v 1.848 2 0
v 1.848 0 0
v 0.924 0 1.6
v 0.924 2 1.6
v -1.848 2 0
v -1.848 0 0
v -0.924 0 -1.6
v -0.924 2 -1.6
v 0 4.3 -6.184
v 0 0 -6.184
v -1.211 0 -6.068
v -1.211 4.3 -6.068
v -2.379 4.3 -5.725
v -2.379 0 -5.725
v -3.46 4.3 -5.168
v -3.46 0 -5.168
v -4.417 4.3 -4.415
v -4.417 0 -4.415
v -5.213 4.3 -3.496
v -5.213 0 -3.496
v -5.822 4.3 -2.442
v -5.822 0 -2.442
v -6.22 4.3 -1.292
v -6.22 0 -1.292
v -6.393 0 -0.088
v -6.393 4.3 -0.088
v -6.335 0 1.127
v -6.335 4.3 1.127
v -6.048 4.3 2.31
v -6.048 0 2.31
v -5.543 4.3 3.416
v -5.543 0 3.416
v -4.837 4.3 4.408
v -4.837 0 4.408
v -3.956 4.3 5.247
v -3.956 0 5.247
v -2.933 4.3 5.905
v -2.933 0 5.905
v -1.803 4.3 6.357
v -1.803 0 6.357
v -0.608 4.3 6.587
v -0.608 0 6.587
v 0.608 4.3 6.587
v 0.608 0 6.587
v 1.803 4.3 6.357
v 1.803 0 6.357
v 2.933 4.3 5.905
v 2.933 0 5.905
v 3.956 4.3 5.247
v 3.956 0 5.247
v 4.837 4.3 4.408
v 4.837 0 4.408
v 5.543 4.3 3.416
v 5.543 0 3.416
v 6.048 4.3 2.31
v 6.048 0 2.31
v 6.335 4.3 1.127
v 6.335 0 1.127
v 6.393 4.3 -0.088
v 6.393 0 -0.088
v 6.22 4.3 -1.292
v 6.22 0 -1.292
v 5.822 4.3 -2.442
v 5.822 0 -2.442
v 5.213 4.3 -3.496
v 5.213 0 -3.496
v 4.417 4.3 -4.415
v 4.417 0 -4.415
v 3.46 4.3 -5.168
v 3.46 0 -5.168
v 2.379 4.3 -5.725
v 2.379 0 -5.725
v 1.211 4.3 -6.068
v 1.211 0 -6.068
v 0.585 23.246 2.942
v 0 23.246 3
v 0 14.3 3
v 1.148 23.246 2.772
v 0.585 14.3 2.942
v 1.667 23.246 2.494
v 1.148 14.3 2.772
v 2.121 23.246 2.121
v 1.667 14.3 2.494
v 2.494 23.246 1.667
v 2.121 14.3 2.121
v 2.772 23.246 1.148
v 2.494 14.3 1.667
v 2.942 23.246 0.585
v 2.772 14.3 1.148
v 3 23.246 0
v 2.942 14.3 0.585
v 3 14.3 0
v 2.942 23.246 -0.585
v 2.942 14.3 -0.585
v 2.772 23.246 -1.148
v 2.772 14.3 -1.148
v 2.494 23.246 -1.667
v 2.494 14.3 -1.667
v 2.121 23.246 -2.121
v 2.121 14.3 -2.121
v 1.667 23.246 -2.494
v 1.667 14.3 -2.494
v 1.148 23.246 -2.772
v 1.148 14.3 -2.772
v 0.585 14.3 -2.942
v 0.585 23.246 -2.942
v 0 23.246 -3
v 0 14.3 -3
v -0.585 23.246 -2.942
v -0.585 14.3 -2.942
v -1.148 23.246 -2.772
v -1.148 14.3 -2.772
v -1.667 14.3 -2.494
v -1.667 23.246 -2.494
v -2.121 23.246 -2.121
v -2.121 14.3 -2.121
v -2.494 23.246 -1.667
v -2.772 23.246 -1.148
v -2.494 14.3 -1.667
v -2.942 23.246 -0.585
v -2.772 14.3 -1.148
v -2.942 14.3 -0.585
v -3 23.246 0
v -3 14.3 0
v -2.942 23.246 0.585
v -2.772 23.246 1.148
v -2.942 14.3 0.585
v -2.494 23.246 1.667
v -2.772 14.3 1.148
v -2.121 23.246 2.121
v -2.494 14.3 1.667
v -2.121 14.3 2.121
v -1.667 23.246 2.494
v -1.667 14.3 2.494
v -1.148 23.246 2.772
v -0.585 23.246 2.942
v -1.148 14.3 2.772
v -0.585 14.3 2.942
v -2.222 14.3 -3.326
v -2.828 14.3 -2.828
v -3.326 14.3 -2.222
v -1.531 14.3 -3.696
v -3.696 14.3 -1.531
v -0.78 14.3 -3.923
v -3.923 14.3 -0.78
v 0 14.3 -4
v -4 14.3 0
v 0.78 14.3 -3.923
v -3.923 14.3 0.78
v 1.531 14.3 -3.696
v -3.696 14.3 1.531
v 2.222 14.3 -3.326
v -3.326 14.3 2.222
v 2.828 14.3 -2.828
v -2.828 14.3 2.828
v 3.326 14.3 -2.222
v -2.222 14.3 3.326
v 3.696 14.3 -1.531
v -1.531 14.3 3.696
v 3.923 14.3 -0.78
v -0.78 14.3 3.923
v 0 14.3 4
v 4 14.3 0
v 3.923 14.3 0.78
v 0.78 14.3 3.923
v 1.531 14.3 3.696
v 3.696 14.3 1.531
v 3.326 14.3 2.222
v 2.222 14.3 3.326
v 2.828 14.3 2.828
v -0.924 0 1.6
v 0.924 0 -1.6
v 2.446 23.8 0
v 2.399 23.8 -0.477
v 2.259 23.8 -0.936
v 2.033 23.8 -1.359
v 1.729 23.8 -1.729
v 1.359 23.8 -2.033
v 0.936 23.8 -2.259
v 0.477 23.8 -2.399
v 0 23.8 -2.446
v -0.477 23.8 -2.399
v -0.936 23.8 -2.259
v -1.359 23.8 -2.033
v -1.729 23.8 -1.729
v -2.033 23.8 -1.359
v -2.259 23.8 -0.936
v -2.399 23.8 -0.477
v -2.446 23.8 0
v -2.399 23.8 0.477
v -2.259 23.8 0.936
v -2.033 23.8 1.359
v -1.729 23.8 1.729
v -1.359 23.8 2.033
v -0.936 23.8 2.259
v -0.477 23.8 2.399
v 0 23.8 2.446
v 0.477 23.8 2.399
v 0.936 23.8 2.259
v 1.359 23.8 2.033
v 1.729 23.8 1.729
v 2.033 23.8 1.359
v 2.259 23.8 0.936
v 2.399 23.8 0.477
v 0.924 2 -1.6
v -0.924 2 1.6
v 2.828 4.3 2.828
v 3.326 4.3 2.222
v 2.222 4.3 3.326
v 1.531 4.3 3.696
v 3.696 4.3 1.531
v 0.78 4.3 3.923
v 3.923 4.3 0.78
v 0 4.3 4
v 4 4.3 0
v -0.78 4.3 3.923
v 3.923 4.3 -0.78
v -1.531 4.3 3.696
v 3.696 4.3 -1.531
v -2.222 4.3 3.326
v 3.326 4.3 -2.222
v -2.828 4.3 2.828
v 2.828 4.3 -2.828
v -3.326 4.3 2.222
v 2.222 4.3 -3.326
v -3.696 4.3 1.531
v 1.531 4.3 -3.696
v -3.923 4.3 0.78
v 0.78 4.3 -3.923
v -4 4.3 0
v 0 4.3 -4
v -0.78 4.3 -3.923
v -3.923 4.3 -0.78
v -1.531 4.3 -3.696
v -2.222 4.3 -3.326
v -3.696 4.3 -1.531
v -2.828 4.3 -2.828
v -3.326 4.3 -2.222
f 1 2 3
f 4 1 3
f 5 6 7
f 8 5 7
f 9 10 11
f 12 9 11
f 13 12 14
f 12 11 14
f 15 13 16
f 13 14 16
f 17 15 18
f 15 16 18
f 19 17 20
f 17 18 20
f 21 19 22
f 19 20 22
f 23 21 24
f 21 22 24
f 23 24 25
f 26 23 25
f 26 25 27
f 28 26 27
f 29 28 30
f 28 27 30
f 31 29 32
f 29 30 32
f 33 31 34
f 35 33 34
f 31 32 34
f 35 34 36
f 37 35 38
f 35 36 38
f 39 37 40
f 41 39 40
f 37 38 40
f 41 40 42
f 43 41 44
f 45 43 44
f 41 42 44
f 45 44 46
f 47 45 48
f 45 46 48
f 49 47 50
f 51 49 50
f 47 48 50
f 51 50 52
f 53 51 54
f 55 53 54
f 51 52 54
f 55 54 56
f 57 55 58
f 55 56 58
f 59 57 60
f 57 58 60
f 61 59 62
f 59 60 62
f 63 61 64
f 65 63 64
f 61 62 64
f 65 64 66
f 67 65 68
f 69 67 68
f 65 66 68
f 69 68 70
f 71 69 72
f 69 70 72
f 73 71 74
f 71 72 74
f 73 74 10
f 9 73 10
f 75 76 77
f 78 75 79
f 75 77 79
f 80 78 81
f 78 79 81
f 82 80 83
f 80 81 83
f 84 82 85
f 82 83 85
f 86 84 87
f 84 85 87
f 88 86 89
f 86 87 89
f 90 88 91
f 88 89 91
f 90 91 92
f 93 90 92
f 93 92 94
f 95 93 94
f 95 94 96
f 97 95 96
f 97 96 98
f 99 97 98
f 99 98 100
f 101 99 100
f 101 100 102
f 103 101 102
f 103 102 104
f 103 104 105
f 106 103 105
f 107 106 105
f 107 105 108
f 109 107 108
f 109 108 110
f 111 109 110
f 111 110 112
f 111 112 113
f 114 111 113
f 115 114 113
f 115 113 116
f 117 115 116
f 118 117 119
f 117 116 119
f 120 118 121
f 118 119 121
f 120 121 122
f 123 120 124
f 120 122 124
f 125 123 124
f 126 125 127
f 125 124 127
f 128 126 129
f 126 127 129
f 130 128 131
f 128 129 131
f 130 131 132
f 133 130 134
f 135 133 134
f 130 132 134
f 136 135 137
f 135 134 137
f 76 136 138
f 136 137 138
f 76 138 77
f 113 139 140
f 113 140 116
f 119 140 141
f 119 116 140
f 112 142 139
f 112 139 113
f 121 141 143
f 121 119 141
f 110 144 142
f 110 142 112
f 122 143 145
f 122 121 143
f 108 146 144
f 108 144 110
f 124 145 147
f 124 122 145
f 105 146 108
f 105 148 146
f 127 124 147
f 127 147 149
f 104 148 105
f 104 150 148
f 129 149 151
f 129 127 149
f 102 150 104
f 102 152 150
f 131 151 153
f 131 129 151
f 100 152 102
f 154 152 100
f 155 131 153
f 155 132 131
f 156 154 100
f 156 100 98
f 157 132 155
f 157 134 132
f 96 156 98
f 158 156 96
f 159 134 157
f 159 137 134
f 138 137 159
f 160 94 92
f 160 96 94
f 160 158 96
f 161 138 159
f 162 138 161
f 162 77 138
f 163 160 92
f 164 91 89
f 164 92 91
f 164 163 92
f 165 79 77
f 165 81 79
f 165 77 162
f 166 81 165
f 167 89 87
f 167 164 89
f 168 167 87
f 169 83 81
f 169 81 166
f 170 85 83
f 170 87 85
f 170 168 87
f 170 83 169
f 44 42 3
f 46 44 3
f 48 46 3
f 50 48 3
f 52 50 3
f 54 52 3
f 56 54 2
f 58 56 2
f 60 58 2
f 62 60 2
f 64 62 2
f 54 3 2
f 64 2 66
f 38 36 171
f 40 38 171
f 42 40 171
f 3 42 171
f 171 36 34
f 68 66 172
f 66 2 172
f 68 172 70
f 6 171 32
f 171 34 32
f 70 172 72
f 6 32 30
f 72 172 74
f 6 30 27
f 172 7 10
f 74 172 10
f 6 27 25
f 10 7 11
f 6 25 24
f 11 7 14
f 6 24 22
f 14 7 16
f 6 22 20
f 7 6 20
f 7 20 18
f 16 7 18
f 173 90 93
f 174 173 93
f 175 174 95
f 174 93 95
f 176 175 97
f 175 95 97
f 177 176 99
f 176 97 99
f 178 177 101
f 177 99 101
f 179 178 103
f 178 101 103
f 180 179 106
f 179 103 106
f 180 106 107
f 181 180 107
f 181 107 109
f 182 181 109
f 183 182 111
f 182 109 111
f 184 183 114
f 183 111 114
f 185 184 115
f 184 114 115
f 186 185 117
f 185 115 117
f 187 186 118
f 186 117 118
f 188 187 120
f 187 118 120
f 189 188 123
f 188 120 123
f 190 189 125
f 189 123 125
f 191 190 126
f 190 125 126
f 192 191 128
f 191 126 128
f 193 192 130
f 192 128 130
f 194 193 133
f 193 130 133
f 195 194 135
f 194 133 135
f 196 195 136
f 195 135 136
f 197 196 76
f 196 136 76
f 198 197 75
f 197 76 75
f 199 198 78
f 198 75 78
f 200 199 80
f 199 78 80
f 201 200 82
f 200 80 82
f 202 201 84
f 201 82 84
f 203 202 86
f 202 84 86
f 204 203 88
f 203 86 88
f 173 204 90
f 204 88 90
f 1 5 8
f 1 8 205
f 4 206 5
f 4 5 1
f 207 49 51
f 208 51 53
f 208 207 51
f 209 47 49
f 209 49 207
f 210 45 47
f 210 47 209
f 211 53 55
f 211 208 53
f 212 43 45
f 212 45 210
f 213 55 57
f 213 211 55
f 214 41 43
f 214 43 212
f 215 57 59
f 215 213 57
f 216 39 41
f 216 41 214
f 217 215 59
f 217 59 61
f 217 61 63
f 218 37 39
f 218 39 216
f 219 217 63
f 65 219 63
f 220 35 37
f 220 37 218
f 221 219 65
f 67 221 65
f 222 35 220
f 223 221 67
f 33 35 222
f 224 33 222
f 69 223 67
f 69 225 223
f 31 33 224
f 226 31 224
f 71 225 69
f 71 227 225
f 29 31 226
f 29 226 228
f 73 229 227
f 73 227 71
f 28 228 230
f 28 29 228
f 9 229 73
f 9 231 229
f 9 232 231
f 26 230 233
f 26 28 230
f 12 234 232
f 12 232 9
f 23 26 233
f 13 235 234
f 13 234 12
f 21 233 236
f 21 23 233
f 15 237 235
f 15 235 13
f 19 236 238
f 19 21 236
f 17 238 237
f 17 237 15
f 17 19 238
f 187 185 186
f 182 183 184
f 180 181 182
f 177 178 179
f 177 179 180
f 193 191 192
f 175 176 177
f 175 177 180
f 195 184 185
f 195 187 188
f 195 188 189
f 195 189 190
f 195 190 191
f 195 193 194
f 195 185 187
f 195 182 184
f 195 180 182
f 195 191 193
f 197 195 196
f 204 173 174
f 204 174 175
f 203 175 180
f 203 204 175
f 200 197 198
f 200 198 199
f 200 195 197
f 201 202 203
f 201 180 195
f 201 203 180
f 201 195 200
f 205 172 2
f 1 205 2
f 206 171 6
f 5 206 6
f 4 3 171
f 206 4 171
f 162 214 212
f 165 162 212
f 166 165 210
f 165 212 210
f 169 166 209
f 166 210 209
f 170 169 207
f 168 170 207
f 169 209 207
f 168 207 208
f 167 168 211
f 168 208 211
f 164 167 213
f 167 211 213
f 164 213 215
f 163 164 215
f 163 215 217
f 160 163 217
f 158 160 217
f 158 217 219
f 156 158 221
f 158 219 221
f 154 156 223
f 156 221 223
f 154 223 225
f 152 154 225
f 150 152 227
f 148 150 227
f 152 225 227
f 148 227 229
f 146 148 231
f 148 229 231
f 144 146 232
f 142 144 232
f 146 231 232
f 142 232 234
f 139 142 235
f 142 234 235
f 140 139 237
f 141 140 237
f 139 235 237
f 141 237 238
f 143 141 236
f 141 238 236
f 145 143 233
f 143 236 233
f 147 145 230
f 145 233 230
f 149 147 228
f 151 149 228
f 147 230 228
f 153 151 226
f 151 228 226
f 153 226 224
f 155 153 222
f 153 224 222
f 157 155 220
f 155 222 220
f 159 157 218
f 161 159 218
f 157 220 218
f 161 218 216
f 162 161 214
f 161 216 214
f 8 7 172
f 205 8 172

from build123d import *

# Parameters (mm, degrees)
SKETCH_1_R          = 6.4
EXTRUDE_1_DEPTH     = 4.3
SKETCH_2_R          = 4
EXTRUDE_2_DEPTH     = 10
SKETCH_3_R          = 3
EXTRUDE_3_DEPTH     = 9.5
CUT_EXTRUDE_1_DEPTH = 2


# Read off the part's stored shape, not the designer's step: M6x1.0 机械螺纹 螺柱1
with BuildPart() as part:
    # 草图1 → 凸台-拉伸1 (new body)
    with BuildSketch(Plane(origin=(0, 0, 0), x_dir=(1, 0, 0), z_dir=(0, 1, 0))):
        with Locations(Location((0, -0.216468968, 0), (0, 0, 90))):
            Circle(SKETCH_1_R)
    extrude(amount=EXTRUDE_1_DEPTH)

    # 草图2 → 凸台-拉伸2 (add)
    with BuildSketch(Plane(origin=(0, 4.3, 0), x_dir=(1, 0, 0), z_dir=(0, 1, 0))):
        with Locations(Location((0, 0, 0), (0, 0, 270))):
            Circle(SKETCH_2_R)
    extrude(amount=EXTRUDE_2_DEPTH)

    # 草图3 → 凸台-拉伸3 (add)
    with BuildSketch(Plane(origin=(0, 14.3, 0), x_dir=(1, 0, 0), z_dir=(0, 1, 0))):
        with Locations(Location((0, 0, 0), (0, 0, 270))):
            Circle(SKETCH_3_R)
    extrude(amount=EXTRUDE_3_DEPTH)

    # M6x1.0 机械螺纹 螺柱1 outline → M6x1.0 机械螺纹 螺柱1 (revolve, cut)
    with BuildSketch(Plane.XY):
        Polygon((3, 23.8), (2.4455, 23.8), (3, 23.2455), align=None)
    revolve(axis=Axis((0, 0, 0), (0, 1, 0)), mode=Mode.SUBTRACT)

    # 草图5 → 切除-拉伸1 (cut)
    with BuildSketch(Plane.XZ):
        Polygon((1.847520861, 0), (0.923760431, 1.6), (-0.923760431, 1.6), (-1.847520861, 0), (-0.923760431, -1.6), (0.923760431, -1.6), align=None)
    extrude(amount=-CUT_EXTRUDE_1_DEPTH, mode=Mode.SUBTRACT)


solid = part.part
